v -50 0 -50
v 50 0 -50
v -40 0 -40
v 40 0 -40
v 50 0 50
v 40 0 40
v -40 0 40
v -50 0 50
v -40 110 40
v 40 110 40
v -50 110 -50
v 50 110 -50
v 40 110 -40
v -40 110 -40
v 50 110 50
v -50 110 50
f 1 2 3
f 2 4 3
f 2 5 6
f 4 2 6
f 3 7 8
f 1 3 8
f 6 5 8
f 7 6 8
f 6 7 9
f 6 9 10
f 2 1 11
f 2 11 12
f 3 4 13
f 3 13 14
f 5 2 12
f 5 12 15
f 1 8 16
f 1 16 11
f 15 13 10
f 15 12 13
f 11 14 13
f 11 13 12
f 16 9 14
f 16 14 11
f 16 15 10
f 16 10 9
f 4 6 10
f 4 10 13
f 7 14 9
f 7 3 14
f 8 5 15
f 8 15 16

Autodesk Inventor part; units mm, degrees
ref_plane "YZ Plane" through (0, 0, 0) normal (1, 0, 0) x (0, 1, 0)
ref_plane "XZ Plane" through (0, 0, 0) normal (0, 1, 0) x (-1, 0, 0)
ref_plane "XY Plane" through (0, 0, 0) normal (0, 0, 1) x (1, 0, 0)
sketch "Sketch1" plane through (0, 0, 0) normal (0, 1, 0) x (-1, 0, 0)
  line L0 (50, -50) -> (-50, -50)
  line L1 (-50, -50) -> (-50, 50)
  line L2 (-50, 50) -> (50, 50)
  line L3 (50, 50) -> (50, -50)
  line L4 (50, -50) -> (-50, 50) construction
  line L5 (-50, -50) -> (50, 50) construction
  line L6 (-40, -40) -> (40, -40)
  line L7 (40, -40) -> (40, 40)
  line L8 (40, 40) -> (-40, 40)
  line L9 (-40, 40) -> (-40, -40)
  line L10 (-40, -40) -> (40, 40) construction
  line L11 (40, -40) -> (-40, 40) construction
  point P0 (0, 0)
  dimension "d0" = 100
  dimension "d1" = 100
  dimension "d2" = 80
  dimension "d3" = 80
extrude "Extrusion1" add sketch "Sketch1" along normal blind 110
properties part number "D1_lenght" material "Steel, Alloy"
